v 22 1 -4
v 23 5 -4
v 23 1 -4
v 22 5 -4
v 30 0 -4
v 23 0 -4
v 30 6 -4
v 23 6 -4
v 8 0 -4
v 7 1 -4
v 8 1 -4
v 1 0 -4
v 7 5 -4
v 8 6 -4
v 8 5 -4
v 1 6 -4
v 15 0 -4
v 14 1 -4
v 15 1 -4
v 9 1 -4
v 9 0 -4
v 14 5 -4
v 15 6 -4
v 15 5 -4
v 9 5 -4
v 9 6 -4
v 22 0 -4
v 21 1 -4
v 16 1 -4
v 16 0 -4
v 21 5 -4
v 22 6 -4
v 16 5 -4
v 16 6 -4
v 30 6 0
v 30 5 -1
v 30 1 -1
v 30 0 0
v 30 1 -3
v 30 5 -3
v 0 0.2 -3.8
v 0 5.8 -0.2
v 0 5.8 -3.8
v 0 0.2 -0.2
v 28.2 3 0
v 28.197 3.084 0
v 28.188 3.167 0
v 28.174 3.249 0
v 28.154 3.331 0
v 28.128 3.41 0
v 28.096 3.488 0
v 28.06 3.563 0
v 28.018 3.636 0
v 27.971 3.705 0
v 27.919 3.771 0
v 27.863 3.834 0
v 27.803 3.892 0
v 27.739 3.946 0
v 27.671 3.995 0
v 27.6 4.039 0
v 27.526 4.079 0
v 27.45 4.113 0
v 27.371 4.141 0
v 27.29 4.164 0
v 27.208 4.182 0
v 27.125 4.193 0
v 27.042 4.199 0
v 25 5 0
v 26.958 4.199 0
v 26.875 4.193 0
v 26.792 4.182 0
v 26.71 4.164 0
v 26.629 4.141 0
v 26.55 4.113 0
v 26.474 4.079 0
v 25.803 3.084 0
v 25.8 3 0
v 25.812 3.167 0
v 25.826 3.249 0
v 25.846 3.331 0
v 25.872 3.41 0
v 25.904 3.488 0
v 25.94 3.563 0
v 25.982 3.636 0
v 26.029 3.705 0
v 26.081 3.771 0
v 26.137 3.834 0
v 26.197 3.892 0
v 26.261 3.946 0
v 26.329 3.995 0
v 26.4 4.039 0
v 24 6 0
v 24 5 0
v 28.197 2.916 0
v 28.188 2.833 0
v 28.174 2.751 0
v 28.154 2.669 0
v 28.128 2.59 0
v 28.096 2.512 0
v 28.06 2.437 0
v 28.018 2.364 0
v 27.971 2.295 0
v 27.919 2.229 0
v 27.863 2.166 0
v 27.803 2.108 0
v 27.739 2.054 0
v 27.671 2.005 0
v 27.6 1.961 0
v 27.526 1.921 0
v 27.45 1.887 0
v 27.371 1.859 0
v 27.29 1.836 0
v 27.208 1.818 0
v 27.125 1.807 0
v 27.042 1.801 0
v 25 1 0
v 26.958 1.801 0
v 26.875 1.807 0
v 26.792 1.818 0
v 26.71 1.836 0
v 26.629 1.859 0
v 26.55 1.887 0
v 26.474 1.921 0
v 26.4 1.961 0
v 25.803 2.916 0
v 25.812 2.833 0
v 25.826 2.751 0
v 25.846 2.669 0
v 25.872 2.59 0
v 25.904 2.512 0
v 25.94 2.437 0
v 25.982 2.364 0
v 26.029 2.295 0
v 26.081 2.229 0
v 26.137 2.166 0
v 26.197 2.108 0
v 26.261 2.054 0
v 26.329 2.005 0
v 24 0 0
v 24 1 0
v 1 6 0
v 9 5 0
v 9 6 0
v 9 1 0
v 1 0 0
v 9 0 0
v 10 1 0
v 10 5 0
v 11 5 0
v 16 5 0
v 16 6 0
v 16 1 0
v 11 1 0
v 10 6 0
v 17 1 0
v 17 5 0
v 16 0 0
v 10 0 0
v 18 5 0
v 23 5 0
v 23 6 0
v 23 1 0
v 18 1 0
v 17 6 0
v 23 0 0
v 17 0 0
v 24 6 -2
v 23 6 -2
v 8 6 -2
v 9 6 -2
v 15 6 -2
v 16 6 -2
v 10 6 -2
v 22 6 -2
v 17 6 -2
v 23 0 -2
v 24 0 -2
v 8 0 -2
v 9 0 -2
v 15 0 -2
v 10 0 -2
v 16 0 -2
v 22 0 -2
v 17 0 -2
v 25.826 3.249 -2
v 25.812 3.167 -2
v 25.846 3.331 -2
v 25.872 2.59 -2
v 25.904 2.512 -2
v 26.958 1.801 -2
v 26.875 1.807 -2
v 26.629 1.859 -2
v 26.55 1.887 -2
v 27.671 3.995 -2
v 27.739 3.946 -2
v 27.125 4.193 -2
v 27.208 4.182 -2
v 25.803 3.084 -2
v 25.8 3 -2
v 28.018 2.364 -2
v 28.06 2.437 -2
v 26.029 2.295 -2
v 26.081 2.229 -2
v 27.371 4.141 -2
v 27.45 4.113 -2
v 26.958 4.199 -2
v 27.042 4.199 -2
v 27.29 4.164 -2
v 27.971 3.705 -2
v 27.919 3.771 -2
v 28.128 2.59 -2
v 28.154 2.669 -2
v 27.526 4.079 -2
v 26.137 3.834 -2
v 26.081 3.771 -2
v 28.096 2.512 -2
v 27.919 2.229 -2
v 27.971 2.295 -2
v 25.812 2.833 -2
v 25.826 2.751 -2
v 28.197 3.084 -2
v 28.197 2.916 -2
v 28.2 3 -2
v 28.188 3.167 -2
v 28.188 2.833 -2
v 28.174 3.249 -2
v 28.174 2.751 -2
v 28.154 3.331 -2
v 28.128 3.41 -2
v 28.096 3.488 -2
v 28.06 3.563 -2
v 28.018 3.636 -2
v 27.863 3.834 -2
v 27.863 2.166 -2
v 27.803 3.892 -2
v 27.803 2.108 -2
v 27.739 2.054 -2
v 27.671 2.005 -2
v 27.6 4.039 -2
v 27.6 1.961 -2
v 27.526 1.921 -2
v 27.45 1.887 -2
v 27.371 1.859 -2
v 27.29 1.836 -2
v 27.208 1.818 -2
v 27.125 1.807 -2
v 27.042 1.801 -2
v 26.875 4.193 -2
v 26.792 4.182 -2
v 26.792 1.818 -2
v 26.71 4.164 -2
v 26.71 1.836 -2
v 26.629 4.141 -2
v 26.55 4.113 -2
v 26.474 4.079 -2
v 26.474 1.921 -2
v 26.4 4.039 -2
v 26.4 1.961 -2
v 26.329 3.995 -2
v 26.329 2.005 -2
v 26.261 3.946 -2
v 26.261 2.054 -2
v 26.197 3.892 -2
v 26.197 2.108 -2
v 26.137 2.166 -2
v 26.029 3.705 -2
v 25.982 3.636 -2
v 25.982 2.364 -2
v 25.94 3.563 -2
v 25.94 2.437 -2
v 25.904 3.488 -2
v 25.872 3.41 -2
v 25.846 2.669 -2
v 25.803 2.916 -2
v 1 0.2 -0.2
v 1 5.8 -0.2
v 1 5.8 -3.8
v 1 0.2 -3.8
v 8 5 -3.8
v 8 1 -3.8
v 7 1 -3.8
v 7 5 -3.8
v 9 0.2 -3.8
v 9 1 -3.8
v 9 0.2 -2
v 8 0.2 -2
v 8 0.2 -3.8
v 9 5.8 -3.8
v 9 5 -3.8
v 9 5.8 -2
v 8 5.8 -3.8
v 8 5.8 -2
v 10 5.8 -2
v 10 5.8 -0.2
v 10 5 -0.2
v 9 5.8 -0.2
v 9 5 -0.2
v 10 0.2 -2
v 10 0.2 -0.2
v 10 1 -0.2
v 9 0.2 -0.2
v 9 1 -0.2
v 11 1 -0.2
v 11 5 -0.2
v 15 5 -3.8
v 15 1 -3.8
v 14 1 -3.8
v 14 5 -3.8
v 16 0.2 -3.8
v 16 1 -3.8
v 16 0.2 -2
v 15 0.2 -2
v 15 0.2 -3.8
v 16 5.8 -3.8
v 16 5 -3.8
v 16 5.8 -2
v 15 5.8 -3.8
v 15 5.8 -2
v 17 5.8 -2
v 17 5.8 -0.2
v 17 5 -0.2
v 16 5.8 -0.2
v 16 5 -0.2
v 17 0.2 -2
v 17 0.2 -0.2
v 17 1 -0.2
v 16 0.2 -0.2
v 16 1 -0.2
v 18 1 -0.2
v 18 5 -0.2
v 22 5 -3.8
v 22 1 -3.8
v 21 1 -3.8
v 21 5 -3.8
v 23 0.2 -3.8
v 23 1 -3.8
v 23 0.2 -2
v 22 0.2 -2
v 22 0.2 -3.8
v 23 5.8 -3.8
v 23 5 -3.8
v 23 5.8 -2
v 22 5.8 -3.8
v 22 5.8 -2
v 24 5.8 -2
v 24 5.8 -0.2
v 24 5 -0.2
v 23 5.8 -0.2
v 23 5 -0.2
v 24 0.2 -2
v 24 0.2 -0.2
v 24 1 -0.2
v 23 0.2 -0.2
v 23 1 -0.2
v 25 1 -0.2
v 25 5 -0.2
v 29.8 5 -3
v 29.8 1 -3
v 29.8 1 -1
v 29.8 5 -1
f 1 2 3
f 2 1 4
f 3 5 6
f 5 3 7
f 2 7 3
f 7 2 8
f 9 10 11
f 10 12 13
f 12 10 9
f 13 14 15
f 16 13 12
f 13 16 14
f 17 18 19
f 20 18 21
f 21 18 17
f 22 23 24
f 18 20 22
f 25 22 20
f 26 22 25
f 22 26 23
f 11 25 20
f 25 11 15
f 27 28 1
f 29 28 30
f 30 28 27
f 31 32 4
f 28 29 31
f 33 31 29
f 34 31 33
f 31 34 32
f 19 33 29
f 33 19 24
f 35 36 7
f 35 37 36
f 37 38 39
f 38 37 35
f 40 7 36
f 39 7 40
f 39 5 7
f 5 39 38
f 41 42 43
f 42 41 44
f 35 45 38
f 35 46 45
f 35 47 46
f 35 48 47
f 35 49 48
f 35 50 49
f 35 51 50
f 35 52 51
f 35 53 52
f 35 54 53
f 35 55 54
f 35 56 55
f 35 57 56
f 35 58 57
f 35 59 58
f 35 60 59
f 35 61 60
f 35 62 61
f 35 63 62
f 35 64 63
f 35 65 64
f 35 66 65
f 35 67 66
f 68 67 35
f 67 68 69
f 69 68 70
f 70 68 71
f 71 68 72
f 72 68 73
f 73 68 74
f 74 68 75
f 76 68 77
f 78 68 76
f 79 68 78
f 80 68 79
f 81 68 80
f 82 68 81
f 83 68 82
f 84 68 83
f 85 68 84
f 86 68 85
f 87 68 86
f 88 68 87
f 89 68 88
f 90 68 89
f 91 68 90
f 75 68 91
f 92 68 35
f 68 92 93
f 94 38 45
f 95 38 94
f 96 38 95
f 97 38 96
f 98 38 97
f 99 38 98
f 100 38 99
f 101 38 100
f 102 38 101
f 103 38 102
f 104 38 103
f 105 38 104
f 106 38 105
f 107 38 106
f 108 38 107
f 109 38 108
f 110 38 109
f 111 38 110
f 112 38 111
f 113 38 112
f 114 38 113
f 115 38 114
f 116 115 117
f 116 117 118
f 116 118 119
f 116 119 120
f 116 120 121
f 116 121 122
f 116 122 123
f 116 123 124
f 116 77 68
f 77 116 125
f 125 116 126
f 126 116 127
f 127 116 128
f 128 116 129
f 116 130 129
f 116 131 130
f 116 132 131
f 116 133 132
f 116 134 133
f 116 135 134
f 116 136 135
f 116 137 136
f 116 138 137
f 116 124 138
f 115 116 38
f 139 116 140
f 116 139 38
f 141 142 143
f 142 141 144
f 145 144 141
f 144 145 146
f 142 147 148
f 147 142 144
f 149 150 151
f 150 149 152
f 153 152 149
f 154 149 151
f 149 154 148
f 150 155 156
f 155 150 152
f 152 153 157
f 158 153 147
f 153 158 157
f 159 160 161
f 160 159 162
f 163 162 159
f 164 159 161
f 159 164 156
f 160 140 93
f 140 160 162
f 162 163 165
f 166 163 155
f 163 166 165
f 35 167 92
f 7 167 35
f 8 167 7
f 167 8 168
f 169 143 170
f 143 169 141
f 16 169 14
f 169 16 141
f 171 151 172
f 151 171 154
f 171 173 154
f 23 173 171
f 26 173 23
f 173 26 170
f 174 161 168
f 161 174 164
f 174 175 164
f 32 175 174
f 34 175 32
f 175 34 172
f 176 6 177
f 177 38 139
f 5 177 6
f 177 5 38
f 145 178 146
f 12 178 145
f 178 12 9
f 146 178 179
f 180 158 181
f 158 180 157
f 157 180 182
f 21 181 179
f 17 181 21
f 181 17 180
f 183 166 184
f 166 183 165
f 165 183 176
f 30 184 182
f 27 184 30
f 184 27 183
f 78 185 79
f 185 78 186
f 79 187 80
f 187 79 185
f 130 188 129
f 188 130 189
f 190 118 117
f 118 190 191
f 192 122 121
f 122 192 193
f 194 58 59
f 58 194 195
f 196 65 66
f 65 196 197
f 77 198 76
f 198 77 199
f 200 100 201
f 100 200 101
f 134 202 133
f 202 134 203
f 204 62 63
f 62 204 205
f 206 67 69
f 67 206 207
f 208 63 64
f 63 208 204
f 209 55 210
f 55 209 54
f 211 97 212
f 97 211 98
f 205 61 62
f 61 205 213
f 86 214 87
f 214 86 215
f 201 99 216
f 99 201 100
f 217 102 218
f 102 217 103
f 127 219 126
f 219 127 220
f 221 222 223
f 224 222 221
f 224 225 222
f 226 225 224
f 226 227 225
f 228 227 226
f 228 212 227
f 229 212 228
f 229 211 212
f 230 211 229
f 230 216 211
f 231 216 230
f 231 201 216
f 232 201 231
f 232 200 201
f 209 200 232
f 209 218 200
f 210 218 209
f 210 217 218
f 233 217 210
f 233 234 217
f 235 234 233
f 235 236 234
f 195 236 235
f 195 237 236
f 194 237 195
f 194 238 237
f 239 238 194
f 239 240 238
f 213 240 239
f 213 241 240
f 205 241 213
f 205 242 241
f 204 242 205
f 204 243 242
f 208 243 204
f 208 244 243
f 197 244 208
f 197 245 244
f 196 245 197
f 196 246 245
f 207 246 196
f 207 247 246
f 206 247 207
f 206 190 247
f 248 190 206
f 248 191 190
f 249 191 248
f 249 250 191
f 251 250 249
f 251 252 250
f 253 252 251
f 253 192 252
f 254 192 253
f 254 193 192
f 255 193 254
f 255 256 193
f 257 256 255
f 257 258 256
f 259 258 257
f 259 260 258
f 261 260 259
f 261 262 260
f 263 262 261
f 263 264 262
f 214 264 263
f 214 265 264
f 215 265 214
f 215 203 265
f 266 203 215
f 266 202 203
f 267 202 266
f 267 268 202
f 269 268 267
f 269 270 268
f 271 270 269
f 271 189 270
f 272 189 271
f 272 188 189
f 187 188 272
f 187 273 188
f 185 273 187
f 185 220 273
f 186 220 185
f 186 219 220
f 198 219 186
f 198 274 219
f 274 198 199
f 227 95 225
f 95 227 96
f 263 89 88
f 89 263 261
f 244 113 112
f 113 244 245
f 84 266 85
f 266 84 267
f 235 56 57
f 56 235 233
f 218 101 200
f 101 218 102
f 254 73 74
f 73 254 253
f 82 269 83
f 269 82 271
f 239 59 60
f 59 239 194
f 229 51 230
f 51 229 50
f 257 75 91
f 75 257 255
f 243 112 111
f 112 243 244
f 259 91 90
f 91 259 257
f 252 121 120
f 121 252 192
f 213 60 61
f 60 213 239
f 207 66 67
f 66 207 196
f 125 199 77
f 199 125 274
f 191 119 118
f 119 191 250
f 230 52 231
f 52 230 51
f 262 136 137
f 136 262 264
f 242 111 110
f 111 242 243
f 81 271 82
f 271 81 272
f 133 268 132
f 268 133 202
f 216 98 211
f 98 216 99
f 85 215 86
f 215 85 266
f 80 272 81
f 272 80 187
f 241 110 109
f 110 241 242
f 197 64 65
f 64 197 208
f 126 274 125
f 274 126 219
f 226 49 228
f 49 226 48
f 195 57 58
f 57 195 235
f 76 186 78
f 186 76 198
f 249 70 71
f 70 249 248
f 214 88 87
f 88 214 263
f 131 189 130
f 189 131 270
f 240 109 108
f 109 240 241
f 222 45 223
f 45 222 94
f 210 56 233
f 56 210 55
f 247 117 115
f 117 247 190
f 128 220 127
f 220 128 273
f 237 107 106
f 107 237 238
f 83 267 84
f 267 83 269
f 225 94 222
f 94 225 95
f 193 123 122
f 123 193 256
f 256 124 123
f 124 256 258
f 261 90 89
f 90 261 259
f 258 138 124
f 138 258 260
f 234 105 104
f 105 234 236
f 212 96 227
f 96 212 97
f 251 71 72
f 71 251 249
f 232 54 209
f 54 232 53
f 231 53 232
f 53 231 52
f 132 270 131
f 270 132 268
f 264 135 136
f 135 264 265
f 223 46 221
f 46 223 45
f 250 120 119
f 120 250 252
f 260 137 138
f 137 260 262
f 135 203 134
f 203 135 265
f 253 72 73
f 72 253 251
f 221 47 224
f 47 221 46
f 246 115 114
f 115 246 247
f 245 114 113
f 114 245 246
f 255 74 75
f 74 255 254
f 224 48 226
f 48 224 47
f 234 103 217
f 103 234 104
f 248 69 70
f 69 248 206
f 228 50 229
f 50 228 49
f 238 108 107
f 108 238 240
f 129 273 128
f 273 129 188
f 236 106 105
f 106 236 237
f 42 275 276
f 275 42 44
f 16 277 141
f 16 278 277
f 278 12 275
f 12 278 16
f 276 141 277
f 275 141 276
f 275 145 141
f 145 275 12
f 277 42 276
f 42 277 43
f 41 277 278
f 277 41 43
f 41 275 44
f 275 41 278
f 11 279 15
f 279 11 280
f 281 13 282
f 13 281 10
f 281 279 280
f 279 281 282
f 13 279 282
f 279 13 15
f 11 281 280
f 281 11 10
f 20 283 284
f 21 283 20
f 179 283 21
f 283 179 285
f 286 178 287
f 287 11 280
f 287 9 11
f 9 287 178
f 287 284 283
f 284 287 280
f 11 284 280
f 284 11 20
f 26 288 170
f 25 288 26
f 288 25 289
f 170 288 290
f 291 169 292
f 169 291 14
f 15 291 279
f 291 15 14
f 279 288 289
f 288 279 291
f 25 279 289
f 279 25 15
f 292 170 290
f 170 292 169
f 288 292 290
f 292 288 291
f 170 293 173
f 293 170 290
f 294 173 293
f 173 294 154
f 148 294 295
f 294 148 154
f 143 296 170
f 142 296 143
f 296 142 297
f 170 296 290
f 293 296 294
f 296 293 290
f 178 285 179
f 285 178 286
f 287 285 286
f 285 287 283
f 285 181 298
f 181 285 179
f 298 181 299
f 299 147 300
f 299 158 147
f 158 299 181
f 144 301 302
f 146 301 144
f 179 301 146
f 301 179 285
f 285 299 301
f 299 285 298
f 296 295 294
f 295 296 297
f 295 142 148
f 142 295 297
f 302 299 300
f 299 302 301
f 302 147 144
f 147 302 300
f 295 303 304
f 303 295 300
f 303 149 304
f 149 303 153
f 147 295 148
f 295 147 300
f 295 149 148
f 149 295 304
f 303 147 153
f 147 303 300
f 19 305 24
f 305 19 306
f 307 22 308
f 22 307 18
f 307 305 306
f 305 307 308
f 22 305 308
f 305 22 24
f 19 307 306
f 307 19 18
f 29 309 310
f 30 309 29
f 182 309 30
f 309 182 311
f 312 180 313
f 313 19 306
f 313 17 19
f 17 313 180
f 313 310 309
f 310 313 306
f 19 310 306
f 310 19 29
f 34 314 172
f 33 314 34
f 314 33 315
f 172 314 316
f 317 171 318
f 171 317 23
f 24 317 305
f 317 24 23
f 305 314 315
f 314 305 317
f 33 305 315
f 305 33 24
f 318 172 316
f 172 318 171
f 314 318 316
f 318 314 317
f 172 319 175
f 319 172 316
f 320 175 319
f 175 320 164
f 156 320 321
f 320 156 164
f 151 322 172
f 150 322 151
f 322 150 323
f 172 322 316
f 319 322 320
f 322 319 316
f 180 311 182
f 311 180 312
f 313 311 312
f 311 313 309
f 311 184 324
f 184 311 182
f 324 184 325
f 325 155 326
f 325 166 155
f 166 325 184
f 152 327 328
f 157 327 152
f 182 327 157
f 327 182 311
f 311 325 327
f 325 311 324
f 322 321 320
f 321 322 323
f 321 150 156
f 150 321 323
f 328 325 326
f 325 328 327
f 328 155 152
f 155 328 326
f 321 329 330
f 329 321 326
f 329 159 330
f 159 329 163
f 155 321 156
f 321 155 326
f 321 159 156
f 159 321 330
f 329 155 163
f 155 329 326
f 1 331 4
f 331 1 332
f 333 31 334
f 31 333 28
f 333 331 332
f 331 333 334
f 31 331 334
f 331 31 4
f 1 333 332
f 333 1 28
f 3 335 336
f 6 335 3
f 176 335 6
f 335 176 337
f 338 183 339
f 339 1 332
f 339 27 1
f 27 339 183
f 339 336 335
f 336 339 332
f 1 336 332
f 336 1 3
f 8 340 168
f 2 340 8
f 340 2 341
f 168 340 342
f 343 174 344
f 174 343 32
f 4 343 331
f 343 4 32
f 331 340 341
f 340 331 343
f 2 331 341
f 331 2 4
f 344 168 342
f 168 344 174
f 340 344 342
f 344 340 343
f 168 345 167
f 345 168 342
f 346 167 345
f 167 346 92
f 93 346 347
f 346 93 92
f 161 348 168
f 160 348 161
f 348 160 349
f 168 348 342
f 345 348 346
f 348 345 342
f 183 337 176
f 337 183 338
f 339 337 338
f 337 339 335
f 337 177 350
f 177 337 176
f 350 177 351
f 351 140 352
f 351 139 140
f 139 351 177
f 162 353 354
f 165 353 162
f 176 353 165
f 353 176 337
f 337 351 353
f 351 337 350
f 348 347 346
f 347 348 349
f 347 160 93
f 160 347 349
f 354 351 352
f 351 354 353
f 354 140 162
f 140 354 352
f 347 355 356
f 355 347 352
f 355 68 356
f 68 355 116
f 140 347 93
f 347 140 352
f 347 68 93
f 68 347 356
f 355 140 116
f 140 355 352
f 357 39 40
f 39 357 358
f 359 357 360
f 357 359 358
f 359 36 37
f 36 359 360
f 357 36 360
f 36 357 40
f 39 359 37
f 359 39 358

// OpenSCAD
//left arm

$fn=90;

rotate([0,90,0]){

difference(){

color("darkgrey"){
cube([4,6,30]);
}

translate([-1,3,27]){
rotate([0,90,0]){
cylinder(r=1.2,h=3);
}
}

//rivet 1

translate([-0.8,0,0]){
color("tan"){
cube([1,6,1]);
}
}

translate([0,5.8,0]){
color("tan"){
cube([4,1,1]);
}
}

translate([3.8,0,0]){
color("tan"){
cube([1,6,1]);
}
}

translate([0,-0.8,0]){
color("tan"){
cube([4,1,1]);
}
}

//rivet 2

translate([3.8,1,7]){
color("tan"){
cube([1,4,1]);
}
}

translate([3.8,0,8]){
color("tan"){
cube([1,1,1]);
}
}

translate([3.8,5,8]){
color("tan"){
cube([1,1,1]);
}
}

translate([2,5.8,8]){
color("tan"){
cube([2,1,1]);
}
}

translate([0,5.8,9]){
color("tan"){
cube([2,1,1]);
}
}

translate([2,-0.8,8]){
color("tan"){
cube([2,1,1]);
}
}

translate([0,-0.8,9]){
color("tan"){
cube([2,1,1]);
}
}

translate([-0.8,5,9]){
color("tan"){
cube([1,1,1]);
}
}

translate([-0.8,0,9]){
color("tan"){
cube([1,1,1]);
}
}

translate([-0.8,1,10]){
color("tan"){
cube([1,4,1]);
}
}

//rivet 3

translate([3.8,1,14]){
color("tan"){
cube([1,4,1]);
}
}

translate([3.8,0,15]){
color("tan"){
cube([1,1,1]);
}
}

translate([3.8,5,15]){
color("tan"){
cube([1,1,1]);
}
}

translate([2,5.8,15]){
color("tan"){
cube([2,1,1]);
}
}

translate([0,5.8,16]){
color("tan"){
cube([2,1,1]);
}
}

translate([2,-0.8,15]){
color("tan"){
cube([2,1,1]);
}
}

translate([0,-0.8,16]){
color("tan"){
cube([2,1,1]);
}
}

translate([-0.8,5,16]){
color("tan"){
cube([1,1,1]);
}
}

translate([-0.8,0,16]){
color("tan"){
cube([1,1,1]);
}
}

translate([-0.8,1,17]){
color("tan"){
cube([1,4,1]);
}
}

//river 4

translate([3.8,1,21]){
color("tan"){
cube([1,4,1]);
}
}

translate([3.8,0,22]){
color("tan"){
cube([1,1,1]);
}
}

translate([3.8,5,22]){
color("tan"){
cube([1,1,1]);
}
}

translate([2,5.8,22]){
color("tan"){
cube([2,1,1]);
}
}

translate([0,5.8,23]){
color("tan"){
cube([2,1,1]);
}
}

translate([2,-0.8,22]){
color("tan"){
cube([2,1,1]);
}
}

translate([0,-0.8,23]){
color("tan"){
cube([2,1,1]);
}
}

translate([-0.8,5,23]){
color("tan"){
cube([1,1,1]);
}
}

translate([-0.8,0,23]){
color("tan"){
cube([1,1,1]);
}
}

translate([-0.8,1,24]){
color("tan"){
cube([1,4,1]);
}
}

//top

translate([1,1,29.8]){
color("grey"){
cube([2,4,1]);
}
}

}//end of diff

}
